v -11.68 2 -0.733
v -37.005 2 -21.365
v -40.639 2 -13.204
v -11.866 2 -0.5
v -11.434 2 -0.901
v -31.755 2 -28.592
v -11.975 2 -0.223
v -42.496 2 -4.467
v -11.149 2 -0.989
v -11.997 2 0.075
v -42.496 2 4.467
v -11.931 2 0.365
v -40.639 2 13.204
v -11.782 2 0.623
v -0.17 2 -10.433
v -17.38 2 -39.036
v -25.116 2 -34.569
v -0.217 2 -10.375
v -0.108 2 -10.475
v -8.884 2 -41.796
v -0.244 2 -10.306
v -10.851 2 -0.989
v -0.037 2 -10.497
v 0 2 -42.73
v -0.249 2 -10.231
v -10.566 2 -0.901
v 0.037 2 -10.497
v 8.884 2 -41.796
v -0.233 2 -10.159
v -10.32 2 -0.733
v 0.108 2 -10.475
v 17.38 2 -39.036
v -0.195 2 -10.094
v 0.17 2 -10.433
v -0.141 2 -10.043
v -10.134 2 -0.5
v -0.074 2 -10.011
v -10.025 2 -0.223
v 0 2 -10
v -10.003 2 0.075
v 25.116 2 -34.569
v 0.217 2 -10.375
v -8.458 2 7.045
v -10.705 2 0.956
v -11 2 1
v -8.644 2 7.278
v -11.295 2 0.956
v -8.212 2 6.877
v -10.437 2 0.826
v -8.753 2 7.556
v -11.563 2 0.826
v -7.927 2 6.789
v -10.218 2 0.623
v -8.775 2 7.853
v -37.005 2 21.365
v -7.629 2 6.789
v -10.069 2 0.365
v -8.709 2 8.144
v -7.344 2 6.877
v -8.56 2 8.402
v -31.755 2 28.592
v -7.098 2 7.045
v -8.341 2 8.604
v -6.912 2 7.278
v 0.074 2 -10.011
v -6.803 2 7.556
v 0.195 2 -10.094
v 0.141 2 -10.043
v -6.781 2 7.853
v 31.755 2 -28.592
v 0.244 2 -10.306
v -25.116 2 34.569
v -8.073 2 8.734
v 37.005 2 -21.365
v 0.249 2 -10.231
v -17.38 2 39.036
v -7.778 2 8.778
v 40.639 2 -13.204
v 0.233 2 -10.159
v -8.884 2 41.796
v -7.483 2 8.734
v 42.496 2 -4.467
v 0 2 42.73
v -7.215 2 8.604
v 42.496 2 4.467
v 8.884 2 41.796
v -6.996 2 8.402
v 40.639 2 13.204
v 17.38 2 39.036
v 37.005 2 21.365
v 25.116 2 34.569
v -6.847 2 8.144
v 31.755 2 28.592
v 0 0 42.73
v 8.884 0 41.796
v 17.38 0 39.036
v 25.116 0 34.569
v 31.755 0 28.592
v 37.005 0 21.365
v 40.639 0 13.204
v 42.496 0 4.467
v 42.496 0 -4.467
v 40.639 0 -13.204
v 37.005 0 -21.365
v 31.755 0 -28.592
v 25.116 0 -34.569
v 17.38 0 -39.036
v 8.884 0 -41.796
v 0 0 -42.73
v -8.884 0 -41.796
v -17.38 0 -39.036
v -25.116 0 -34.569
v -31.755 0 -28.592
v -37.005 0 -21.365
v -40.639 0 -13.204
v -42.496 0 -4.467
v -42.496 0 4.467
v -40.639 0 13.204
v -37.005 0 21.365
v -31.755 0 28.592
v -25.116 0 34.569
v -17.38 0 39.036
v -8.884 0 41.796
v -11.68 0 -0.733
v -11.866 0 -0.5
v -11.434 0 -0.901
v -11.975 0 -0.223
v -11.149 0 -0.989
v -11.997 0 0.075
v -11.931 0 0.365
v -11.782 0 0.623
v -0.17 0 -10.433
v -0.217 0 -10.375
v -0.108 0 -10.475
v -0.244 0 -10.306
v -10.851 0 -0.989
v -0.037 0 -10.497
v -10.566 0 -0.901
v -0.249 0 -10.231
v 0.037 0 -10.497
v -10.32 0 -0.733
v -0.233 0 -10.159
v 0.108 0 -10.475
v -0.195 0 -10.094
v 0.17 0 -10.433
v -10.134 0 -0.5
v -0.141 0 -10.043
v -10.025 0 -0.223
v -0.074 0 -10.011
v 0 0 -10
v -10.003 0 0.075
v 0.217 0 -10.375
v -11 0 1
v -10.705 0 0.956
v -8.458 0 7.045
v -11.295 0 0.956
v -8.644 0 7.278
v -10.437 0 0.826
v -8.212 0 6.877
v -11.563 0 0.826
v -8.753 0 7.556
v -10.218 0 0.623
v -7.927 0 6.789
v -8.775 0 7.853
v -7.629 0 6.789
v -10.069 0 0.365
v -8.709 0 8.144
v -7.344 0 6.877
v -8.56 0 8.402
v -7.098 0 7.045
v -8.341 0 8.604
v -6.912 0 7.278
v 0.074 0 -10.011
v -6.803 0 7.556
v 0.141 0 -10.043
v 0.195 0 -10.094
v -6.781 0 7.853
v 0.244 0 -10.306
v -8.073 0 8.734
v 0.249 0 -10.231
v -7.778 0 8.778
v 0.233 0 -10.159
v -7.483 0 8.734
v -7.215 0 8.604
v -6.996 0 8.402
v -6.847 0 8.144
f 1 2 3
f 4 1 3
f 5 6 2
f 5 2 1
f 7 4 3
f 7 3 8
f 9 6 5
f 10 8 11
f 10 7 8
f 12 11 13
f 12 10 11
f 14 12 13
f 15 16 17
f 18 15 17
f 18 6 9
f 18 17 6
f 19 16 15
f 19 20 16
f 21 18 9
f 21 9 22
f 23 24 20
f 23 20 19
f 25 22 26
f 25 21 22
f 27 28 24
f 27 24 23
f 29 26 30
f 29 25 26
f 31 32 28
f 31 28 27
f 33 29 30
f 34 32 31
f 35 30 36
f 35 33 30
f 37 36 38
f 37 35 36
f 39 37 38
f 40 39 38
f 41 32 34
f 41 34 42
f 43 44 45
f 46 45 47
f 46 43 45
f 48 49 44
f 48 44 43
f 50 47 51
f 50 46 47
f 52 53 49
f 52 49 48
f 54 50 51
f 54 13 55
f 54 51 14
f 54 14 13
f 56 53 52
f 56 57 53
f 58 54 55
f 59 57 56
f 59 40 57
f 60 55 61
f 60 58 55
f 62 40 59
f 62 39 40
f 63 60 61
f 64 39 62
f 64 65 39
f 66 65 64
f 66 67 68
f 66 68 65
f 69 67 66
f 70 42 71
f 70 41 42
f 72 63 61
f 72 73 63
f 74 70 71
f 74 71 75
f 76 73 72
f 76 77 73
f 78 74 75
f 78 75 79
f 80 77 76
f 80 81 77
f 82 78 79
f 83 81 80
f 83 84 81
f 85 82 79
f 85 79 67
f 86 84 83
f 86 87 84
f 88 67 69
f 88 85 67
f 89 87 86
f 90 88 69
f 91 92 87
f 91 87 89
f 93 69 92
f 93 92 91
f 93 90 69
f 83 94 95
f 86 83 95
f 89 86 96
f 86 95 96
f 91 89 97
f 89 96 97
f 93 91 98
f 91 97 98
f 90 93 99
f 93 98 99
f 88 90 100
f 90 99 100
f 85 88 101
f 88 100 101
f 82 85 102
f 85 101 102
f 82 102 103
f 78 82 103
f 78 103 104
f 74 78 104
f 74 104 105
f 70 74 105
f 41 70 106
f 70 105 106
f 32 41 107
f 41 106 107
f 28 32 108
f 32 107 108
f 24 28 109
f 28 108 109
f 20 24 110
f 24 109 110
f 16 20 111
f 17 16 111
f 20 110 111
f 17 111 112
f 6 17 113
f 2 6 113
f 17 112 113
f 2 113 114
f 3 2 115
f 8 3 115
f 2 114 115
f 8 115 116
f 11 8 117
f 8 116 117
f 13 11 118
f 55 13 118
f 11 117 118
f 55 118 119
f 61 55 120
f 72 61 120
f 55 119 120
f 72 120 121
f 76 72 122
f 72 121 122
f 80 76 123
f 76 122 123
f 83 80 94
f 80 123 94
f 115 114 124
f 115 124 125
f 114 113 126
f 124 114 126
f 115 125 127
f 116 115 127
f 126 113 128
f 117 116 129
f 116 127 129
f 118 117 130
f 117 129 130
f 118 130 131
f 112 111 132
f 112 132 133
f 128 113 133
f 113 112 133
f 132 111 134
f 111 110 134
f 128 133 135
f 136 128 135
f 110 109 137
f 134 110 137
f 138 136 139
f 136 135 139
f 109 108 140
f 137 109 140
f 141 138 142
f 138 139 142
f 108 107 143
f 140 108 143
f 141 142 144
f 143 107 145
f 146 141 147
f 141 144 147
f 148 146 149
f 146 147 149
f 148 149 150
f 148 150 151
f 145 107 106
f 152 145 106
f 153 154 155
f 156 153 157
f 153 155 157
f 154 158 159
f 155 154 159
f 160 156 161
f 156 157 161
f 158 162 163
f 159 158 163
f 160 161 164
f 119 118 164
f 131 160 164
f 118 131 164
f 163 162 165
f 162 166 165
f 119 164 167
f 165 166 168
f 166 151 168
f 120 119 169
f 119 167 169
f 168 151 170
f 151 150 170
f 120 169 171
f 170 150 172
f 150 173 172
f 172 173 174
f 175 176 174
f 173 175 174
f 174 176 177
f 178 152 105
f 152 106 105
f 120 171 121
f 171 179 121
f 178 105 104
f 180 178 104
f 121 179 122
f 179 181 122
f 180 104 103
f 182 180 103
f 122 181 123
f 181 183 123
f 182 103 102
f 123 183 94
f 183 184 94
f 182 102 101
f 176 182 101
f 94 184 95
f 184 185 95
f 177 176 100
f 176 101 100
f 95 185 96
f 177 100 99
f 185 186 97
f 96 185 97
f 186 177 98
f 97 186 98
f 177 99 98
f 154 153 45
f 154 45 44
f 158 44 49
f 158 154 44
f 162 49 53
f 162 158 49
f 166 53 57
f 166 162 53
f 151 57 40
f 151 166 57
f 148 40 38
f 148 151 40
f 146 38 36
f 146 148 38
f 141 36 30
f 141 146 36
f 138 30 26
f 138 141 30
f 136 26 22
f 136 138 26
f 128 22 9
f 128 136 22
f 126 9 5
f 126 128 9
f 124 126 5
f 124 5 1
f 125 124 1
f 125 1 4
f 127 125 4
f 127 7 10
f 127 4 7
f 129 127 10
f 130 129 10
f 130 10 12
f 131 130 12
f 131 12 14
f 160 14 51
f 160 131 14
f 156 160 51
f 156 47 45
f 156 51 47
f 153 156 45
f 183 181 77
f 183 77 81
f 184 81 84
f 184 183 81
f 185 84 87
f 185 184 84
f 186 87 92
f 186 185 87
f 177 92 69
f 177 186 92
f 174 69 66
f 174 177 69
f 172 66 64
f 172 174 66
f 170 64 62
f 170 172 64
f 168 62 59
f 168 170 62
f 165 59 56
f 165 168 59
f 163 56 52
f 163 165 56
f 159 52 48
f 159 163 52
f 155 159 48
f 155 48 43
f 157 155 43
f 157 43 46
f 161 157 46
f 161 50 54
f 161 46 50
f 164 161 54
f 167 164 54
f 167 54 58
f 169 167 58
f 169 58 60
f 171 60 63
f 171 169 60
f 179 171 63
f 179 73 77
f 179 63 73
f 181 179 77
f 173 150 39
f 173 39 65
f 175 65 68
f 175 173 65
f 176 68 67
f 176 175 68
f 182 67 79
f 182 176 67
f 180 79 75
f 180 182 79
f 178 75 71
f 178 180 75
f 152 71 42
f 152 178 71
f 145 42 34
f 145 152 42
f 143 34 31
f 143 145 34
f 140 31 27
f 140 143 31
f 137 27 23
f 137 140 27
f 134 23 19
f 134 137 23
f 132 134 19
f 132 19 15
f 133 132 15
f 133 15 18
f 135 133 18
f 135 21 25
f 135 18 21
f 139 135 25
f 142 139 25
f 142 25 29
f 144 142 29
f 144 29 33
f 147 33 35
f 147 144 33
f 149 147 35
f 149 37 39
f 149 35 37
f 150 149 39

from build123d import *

# Parameters (mm, degrees)
SKETCH1_R               = 42.73
BOSS_EXTRUDE1_DEPTH     = 2
CUT_EXTRUDE1_DEPTH      = 61.462432965
CUT_EXTRUDE1_DEPTH_BACK = 61.462432965
SKETCH2_R               = 0.25
CUT_EXTRUDE2_DEPTH      = 61.462432965
CUT_EXTRUDE2_DEPTH_BACK = 61.462432965
SKETCH3_R               = 1


with BuildPart() as part:
    # Sketch1 → Boss-Extrude1 (new body)
    with BuildSketch(Plane(origin=(0, 0, 0), x_dir=(1, 0, 0), z_dir=(0, 1, 0))):
        with Locations(Location((0, 0, 0), (0, 0, 270))):
            Circle(SKETCH1_R)
    extrude(amount=BOSS_EXTRUDE1_DEPTH)

    # Sketch2 → Cut-Extrude1 (cut, two sides: drawn at the far end of the back side and taken through both)
    with BuildSketch(Plane(origin=(0, 2, 0), x_dir=(1, 0, 0), z_dir=(0, 1, 0)).offset(-CUT_EXTRUDE1_DEPTH_BACK)):
        with Locations(Location((0, 10.25, 0), (0, 0, 270))):
            Circle(SKETCH2_R)
    extrude(amount=CUT_EXTRUDE1_DEPTH + CUT_EXTRUDE1_DEPTH_BACK, mode=Mode.SUBTRACT)

    # Sketch3 → Cut-Extrude2 (cut, two sides: drawn at the far end of the back side and taken through both)
    with BuildSketch(Plane(origin=(0, 2, 0), x_dir=(1, 0, 0), z_dir=(0, 1, 0)).offset(-CUT_EXTRUDE2_DEPTH_BACK)):
        with Locations(Location((-11, 0, 0), (0, 0, 270))):
            Circle(SKETCH3_R)
        with Locations(Location((-7.778174593, -7.778174593, 0), (0, 0, 270))):
            Circle(SKETCH3_R)
    extrude(amount=CUT_EXTRUDE2_DEPTH + CUT_EXTRUDE2_DEPTH_BACK, mode=Mode.SUBTRACT)


solid = part.part
